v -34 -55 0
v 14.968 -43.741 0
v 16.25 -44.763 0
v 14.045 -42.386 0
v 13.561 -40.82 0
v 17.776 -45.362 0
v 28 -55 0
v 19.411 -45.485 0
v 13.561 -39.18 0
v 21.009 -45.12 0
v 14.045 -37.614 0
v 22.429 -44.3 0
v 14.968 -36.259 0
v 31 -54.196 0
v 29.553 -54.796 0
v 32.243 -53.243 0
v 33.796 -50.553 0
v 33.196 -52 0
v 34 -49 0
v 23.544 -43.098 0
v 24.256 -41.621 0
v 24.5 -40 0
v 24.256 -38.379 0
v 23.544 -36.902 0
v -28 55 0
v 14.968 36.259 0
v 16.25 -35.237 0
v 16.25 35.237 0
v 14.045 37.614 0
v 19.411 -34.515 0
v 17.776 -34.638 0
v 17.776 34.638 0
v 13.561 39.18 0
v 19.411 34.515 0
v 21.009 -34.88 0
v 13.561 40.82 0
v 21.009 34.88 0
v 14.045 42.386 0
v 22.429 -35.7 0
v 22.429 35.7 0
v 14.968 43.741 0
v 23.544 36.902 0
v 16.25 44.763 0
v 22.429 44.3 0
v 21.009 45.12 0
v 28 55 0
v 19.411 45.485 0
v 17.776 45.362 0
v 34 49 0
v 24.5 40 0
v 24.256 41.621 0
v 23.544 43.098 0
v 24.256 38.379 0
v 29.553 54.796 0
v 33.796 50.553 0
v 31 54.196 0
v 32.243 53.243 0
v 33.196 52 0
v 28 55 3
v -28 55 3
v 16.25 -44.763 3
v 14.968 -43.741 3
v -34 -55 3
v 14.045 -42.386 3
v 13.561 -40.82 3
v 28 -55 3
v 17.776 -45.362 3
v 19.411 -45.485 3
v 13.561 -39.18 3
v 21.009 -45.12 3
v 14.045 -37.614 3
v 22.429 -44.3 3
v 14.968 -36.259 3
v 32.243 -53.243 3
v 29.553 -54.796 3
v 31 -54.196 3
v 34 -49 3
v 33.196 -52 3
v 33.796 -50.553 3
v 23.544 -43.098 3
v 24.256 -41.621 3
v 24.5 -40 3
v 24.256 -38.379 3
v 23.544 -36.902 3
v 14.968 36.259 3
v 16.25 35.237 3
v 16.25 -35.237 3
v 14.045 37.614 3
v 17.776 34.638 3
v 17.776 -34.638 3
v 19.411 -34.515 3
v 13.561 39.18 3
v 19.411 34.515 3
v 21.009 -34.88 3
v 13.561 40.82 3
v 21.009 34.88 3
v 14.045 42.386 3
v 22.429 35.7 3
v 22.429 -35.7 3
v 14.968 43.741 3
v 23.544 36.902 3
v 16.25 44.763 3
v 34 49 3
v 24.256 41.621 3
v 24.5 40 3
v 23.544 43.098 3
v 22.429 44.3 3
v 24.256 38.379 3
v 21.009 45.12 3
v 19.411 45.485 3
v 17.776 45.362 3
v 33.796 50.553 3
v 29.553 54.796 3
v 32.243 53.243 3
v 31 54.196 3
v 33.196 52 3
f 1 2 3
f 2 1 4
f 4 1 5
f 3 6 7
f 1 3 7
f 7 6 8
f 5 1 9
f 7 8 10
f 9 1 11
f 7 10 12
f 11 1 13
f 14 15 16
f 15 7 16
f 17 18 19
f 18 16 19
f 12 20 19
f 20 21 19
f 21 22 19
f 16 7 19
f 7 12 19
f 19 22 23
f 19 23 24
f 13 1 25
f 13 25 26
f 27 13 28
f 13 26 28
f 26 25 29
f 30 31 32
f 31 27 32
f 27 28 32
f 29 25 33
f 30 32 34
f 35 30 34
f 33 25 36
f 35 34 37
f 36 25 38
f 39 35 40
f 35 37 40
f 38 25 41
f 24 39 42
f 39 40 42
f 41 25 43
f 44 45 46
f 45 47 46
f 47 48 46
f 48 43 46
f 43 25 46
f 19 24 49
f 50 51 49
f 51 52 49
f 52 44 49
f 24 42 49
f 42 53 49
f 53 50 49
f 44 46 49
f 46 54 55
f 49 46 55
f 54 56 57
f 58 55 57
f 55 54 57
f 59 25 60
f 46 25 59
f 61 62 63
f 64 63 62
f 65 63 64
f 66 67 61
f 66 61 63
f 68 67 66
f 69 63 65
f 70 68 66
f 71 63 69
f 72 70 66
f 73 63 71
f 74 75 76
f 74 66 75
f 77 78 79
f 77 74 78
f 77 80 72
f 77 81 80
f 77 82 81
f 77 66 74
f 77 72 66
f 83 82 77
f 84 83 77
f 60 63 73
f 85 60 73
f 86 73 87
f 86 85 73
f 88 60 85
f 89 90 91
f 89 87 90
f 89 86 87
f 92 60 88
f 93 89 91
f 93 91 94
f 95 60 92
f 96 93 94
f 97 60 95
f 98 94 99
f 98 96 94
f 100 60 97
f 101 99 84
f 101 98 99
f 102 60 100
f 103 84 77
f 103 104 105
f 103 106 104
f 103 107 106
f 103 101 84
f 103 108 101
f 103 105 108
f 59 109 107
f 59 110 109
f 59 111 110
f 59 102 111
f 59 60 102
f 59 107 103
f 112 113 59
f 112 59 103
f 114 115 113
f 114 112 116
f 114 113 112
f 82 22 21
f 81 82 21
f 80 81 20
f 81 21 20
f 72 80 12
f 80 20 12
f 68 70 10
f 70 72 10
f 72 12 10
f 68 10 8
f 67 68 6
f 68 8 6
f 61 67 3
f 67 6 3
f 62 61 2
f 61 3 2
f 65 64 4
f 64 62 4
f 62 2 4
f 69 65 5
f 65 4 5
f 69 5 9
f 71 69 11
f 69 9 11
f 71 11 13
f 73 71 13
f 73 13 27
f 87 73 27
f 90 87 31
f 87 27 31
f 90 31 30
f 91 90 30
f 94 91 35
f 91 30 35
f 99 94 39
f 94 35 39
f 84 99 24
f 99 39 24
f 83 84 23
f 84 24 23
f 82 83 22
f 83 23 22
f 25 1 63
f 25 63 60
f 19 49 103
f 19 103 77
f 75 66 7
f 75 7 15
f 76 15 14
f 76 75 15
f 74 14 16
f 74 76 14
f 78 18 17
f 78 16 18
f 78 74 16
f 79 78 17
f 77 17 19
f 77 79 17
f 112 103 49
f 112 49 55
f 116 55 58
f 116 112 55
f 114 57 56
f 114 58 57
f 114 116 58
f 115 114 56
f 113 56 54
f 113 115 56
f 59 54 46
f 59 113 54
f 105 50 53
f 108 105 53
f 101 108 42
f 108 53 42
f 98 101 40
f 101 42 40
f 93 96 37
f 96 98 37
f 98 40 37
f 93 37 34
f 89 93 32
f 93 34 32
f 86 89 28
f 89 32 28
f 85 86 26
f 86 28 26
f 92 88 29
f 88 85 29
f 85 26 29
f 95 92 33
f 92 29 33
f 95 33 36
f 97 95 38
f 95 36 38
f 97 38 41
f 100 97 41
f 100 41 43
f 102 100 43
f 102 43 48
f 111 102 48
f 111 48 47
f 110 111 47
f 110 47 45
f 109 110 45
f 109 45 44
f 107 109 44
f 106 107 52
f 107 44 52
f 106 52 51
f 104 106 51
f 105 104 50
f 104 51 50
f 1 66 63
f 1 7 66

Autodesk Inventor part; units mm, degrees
ref_plane "YZ Plane" through (0, 0, 0) normal (1, 0, 0) x (0, 1, 0)
ref_plane "XZ Plane" through (0, 0, 0) normal (0, 1, 0) x (-1, 0, 0)
ref_plane "XY Plane" through (0, 0, 0) normal (0, 0, 1) x (1, 0, 0)
sketch "Sketch1" plane through (0, 0, 0) normal (0, 0, 1) x (1, 0, 0)
  line L0 (-34, 55) -> (34, 55)
  line L1 (34, 55) -> (34, -55)
  line L2 (34, -55) -> (-34, -55)
  line L3 (-34, -55) -> (-34, 55)
  line L4 (-34, 55) -> (34, -55) construction
  line L5 (34, 55) -> (-34, -55) construction
  line L6 (-34, -19) -> (-34, 19)
  circle A0 centre (19, 40) radius 5.5
  circle A1 centre (19, -40) radius 5.5
  line L7 (0, 0) -> (34, 0) construction
  line L8 (-34, -55) -> (-28, 55)
  dimension "d157" = 68
  dimension "d158" = 110
  dimension "d160" = 80
  dimension "d161" = 11
  dimension "d164" = 15
  dimension "d165" = 6
extrude "Plate3" add sketch "Sketch1" along normal blind 3 contours L0 L1 L2 L8
fillet "Corner Round2" radius 6 2 edges at (34, 55, 1.5) (34, -55, 1.5)
equation "\"BendReliefWidth\" = Thickness"
equation "\"BendReliefDepth\" = 0.5 * Thickness"
equation "\"CornerReliefSize\" = 4 * Thickness"
equation "\"MinimumRemnant\" = 2 * Thickness"
equation "\"GapSize\" = Thickness"
equation "\"Thickness\" = 3"
properties part number "MSC 815 wall inner joint" material "AISI304"
